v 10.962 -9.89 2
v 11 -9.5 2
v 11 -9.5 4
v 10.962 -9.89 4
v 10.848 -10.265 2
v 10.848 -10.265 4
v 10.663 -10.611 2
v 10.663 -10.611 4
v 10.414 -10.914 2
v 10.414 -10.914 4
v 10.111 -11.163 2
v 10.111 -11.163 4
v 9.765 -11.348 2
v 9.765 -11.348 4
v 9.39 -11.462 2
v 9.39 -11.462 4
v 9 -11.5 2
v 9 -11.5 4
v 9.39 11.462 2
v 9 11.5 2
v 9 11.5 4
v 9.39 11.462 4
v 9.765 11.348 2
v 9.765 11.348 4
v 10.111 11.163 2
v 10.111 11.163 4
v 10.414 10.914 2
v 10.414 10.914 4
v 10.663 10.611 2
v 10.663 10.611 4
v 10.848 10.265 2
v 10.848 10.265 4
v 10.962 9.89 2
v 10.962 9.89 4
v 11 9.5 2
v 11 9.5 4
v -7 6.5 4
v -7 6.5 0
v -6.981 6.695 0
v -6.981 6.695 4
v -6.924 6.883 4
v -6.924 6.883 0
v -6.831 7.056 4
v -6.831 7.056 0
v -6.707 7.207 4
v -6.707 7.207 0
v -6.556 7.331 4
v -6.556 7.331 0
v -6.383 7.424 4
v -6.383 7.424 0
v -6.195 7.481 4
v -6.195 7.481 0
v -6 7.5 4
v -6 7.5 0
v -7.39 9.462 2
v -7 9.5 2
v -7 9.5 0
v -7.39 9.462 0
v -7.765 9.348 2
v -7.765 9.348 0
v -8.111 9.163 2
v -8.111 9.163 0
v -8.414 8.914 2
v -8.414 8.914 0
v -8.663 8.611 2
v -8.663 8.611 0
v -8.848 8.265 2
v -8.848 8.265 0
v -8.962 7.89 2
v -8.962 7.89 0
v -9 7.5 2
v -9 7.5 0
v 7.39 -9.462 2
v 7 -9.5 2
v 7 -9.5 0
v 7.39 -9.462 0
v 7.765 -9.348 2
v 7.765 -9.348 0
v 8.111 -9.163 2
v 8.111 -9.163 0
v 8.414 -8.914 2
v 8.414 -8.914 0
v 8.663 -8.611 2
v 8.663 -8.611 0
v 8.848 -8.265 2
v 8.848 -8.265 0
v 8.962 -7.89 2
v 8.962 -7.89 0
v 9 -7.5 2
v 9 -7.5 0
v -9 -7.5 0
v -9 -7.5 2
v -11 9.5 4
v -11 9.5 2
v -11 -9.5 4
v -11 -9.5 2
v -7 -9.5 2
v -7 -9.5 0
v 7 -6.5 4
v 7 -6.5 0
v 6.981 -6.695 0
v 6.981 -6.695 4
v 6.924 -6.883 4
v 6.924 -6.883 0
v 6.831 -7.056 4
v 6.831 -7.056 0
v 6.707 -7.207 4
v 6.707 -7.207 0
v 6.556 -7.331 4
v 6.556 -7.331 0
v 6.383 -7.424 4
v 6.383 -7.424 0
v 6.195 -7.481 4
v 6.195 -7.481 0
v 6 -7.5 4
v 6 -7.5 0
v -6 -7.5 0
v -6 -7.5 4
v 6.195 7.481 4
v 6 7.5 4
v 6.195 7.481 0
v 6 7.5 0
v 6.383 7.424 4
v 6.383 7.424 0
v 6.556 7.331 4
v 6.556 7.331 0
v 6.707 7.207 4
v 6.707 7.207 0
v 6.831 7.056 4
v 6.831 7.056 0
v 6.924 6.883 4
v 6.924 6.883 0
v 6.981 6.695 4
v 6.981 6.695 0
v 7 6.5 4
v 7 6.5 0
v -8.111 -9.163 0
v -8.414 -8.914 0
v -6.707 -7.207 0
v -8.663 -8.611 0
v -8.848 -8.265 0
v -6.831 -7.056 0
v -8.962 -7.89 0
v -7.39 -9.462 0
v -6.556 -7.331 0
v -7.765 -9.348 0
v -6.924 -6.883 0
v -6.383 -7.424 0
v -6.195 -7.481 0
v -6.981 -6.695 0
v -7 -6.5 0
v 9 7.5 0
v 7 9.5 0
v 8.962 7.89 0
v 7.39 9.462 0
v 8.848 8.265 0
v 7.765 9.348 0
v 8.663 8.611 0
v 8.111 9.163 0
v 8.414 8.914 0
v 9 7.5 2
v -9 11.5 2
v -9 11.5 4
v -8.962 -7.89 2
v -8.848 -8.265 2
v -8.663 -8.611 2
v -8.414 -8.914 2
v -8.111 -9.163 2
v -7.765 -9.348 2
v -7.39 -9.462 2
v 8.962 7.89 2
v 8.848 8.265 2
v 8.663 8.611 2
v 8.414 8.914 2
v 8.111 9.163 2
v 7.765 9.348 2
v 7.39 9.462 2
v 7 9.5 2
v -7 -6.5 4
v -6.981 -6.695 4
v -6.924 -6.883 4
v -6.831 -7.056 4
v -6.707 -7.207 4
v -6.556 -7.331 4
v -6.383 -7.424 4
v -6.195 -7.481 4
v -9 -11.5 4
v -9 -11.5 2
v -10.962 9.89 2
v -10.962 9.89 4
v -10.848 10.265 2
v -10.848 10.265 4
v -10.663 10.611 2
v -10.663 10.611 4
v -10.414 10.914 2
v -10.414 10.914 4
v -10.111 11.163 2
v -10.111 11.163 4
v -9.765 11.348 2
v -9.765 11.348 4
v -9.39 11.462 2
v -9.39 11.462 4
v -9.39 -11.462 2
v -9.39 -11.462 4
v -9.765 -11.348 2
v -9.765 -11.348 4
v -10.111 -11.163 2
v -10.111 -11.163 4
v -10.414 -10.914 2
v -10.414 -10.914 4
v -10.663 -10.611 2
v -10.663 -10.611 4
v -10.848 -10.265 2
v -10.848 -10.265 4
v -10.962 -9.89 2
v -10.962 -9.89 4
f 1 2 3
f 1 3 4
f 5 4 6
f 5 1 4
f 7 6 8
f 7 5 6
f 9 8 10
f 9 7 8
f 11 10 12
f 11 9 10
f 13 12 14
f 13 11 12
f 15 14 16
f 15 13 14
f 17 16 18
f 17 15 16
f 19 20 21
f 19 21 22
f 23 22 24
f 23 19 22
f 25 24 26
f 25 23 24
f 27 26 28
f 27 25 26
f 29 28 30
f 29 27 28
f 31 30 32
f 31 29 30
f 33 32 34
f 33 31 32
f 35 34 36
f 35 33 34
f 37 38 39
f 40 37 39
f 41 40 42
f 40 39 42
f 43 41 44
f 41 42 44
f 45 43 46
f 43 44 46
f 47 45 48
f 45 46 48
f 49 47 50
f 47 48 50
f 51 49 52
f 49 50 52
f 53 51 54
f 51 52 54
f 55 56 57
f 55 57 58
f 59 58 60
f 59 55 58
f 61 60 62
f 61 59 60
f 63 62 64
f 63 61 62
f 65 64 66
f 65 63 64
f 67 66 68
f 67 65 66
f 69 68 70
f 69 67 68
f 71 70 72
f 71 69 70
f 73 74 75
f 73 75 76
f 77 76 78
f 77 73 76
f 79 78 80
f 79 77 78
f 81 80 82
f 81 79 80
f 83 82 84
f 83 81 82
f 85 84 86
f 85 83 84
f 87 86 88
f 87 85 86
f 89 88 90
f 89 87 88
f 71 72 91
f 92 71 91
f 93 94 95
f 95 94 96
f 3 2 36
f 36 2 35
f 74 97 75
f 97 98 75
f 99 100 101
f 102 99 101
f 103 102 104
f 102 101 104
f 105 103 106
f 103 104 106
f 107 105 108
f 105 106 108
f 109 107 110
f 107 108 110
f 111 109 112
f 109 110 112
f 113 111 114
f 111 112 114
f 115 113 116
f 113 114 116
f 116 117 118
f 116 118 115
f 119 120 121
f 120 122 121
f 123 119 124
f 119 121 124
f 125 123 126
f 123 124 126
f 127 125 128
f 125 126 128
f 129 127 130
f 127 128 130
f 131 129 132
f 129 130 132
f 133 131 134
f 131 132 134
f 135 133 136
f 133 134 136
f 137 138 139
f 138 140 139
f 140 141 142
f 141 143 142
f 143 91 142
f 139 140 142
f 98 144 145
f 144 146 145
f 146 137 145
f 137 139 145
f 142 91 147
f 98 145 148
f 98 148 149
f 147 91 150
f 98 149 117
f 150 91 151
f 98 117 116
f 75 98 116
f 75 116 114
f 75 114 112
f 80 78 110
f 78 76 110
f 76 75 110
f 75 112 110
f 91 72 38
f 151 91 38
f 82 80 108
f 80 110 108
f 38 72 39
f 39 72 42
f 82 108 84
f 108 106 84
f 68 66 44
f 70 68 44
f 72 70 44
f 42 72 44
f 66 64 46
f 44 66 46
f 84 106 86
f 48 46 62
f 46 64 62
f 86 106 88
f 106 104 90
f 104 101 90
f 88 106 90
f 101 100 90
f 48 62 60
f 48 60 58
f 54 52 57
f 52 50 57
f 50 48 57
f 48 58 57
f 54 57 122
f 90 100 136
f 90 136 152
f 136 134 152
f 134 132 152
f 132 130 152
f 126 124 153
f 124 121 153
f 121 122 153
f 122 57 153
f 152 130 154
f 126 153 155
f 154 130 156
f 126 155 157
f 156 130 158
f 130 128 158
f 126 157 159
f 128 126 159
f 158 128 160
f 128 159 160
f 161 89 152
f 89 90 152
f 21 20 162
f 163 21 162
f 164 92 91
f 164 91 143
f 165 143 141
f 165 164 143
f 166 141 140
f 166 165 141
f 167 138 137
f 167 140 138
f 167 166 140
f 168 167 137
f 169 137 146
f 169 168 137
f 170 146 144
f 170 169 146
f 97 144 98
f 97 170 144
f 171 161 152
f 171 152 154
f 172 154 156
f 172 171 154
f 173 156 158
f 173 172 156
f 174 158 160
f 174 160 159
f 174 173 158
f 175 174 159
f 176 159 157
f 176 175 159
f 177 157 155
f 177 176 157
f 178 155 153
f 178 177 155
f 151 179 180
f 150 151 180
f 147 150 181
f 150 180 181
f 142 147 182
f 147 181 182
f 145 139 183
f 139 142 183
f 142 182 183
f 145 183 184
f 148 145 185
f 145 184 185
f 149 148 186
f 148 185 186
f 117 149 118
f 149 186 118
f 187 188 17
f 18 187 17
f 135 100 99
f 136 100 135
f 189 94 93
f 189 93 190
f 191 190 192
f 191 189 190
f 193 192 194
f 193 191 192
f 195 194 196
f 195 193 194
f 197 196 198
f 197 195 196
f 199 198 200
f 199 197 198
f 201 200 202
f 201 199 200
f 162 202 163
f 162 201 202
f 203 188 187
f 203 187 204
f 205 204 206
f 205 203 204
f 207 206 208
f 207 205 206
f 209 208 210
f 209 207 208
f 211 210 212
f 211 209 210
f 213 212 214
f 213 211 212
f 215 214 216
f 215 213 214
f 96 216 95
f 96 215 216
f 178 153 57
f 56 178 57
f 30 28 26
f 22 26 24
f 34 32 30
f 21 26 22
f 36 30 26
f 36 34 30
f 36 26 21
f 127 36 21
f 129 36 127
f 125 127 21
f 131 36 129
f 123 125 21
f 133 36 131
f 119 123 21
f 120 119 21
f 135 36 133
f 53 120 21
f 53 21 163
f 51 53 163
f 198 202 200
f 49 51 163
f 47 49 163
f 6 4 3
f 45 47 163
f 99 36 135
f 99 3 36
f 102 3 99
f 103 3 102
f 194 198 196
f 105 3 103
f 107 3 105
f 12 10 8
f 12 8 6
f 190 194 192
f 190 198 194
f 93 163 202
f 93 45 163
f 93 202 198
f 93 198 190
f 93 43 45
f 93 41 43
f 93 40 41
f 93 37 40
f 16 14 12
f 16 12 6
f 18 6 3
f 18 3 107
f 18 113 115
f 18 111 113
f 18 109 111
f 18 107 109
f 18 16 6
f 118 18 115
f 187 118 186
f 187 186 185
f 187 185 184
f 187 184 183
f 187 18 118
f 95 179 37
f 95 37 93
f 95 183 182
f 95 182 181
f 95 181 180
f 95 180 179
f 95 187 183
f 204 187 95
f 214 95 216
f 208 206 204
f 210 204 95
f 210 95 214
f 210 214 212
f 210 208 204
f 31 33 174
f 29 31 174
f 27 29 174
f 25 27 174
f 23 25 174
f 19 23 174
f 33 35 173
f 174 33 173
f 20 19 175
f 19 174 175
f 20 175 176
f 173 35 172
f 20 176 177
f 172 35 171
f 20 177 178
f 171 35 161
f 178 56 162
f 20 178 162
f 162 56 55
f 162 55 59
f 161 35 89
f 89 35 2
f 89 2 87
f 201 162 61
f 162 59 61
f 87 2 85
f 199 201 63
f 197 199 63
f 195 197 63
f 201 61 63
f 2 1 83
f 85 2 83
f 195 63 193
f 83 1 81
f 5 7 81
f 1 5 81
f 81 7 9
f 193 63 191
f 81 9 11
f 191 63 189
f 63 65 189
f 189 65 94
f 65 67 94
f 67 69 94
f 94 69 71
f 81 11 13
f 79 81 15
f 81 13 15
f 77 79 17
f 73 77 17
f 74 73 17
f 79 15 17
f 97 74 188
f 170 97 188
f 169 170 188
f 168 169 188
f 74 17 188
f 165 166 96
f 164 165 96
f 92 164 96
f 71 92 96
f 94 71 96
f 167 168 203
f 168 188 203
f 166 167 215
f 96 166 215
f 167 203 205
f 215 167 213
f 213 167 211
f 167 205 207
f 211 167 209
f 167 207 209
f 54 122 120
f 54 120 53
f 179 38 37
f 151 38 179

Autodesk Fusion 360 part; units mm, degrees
sketch "Esboço1" plane through (0, 0, 0) normal (0, 0, 1) x (1, 0, 0)
  line L0 (9, 9.5) -> (-9, 9.5)
  line L1 (-9, 9.5) -> (-9, -9.5)
  line L2 (-9, -9.5) -> (9, -9.5)
  line L3 (9, -9.5) -> (9, 9.5)
  line L4 (9, 9.5) -> (-9, -9.5) construction
  line L5 (-9, 9.5) -> (9, -9.5) construction
  line L6 (-7, -7.5) -> (7, -7.5)
  line L7 (7, -7.5) -> (7, 7.5)
  line L8 (7, 7.5) -> (-7, 7.5)
  line L9 (-7, 7.5) -> (-7, -7.5)
  dimension "d1" = 18
  dimension "d2" = 19
  dimension "d3" = -2
extrude "Extrusão1" add sketch "Esboço1" along normal blind 2
sketch "Esboço2" plane through (0, 0, 2) normal (0, 0, 1) x (-1, 0, 0)
  line L0 (7, 7.5) -> (7, -7.5)
  line L1 (7, -7.5) -> (-7, -7.5)
  line L2 (-7, -7.5) -> (-7, 7.5)
  line L3 (-7, 7.5) -> (7, 7.5)
  line L4 (-9, 9.5) -> (-9, -9.5)
  line L5 (-9, -9.5) -> (9, -9.5)
  line L6 (9, -9.5) -> (9, 9.5)
  line L7 (9, 9.5) -> (-9, 9.5)
  line L8 (-11, 9.5) -> (-11, -9.5)
  line L9 (-9, -11.5) -> (9, -11.5)
  line L10 (11, -9.5) -> (11, 9.5)
  line L11 (9, 11.5) -> (-9, 11.5)
  arc A0 (11, 9.5) -> (9, 11.5) centre (9, 9.5) ccw
  arc A1 (-9, 11.5) -> (-11, 9.5) centre (-9, 9.5) ccw
  arc A2 (-11, -9.5) -> (-9, -11.5) centre (-9, -9.5) ccw
  arc A3 (9, -11.5) -> (11, -9.5) centre (9, -9.5) ccw
  dimension "d7" = 2
extrude "Extrusão2" add sketch "Esboço2" along normal blind 2 contours L4 L5 L6 L7 | L8 L9 L10 L11 A0 A1 A2 A3
fillet "Arredondamento1" radius 2 4 edges at (-9, 9.5, 1) (-9, -9.5, 1) (9, 9.5, 1) (9, -9.5, 1)
fillet "Arredondamento2" radius 1 4 edges at (-7, 7.5, 2) (-7, -7.5, 2) (7, -7.5, 2) (7, 7.5, 2)
